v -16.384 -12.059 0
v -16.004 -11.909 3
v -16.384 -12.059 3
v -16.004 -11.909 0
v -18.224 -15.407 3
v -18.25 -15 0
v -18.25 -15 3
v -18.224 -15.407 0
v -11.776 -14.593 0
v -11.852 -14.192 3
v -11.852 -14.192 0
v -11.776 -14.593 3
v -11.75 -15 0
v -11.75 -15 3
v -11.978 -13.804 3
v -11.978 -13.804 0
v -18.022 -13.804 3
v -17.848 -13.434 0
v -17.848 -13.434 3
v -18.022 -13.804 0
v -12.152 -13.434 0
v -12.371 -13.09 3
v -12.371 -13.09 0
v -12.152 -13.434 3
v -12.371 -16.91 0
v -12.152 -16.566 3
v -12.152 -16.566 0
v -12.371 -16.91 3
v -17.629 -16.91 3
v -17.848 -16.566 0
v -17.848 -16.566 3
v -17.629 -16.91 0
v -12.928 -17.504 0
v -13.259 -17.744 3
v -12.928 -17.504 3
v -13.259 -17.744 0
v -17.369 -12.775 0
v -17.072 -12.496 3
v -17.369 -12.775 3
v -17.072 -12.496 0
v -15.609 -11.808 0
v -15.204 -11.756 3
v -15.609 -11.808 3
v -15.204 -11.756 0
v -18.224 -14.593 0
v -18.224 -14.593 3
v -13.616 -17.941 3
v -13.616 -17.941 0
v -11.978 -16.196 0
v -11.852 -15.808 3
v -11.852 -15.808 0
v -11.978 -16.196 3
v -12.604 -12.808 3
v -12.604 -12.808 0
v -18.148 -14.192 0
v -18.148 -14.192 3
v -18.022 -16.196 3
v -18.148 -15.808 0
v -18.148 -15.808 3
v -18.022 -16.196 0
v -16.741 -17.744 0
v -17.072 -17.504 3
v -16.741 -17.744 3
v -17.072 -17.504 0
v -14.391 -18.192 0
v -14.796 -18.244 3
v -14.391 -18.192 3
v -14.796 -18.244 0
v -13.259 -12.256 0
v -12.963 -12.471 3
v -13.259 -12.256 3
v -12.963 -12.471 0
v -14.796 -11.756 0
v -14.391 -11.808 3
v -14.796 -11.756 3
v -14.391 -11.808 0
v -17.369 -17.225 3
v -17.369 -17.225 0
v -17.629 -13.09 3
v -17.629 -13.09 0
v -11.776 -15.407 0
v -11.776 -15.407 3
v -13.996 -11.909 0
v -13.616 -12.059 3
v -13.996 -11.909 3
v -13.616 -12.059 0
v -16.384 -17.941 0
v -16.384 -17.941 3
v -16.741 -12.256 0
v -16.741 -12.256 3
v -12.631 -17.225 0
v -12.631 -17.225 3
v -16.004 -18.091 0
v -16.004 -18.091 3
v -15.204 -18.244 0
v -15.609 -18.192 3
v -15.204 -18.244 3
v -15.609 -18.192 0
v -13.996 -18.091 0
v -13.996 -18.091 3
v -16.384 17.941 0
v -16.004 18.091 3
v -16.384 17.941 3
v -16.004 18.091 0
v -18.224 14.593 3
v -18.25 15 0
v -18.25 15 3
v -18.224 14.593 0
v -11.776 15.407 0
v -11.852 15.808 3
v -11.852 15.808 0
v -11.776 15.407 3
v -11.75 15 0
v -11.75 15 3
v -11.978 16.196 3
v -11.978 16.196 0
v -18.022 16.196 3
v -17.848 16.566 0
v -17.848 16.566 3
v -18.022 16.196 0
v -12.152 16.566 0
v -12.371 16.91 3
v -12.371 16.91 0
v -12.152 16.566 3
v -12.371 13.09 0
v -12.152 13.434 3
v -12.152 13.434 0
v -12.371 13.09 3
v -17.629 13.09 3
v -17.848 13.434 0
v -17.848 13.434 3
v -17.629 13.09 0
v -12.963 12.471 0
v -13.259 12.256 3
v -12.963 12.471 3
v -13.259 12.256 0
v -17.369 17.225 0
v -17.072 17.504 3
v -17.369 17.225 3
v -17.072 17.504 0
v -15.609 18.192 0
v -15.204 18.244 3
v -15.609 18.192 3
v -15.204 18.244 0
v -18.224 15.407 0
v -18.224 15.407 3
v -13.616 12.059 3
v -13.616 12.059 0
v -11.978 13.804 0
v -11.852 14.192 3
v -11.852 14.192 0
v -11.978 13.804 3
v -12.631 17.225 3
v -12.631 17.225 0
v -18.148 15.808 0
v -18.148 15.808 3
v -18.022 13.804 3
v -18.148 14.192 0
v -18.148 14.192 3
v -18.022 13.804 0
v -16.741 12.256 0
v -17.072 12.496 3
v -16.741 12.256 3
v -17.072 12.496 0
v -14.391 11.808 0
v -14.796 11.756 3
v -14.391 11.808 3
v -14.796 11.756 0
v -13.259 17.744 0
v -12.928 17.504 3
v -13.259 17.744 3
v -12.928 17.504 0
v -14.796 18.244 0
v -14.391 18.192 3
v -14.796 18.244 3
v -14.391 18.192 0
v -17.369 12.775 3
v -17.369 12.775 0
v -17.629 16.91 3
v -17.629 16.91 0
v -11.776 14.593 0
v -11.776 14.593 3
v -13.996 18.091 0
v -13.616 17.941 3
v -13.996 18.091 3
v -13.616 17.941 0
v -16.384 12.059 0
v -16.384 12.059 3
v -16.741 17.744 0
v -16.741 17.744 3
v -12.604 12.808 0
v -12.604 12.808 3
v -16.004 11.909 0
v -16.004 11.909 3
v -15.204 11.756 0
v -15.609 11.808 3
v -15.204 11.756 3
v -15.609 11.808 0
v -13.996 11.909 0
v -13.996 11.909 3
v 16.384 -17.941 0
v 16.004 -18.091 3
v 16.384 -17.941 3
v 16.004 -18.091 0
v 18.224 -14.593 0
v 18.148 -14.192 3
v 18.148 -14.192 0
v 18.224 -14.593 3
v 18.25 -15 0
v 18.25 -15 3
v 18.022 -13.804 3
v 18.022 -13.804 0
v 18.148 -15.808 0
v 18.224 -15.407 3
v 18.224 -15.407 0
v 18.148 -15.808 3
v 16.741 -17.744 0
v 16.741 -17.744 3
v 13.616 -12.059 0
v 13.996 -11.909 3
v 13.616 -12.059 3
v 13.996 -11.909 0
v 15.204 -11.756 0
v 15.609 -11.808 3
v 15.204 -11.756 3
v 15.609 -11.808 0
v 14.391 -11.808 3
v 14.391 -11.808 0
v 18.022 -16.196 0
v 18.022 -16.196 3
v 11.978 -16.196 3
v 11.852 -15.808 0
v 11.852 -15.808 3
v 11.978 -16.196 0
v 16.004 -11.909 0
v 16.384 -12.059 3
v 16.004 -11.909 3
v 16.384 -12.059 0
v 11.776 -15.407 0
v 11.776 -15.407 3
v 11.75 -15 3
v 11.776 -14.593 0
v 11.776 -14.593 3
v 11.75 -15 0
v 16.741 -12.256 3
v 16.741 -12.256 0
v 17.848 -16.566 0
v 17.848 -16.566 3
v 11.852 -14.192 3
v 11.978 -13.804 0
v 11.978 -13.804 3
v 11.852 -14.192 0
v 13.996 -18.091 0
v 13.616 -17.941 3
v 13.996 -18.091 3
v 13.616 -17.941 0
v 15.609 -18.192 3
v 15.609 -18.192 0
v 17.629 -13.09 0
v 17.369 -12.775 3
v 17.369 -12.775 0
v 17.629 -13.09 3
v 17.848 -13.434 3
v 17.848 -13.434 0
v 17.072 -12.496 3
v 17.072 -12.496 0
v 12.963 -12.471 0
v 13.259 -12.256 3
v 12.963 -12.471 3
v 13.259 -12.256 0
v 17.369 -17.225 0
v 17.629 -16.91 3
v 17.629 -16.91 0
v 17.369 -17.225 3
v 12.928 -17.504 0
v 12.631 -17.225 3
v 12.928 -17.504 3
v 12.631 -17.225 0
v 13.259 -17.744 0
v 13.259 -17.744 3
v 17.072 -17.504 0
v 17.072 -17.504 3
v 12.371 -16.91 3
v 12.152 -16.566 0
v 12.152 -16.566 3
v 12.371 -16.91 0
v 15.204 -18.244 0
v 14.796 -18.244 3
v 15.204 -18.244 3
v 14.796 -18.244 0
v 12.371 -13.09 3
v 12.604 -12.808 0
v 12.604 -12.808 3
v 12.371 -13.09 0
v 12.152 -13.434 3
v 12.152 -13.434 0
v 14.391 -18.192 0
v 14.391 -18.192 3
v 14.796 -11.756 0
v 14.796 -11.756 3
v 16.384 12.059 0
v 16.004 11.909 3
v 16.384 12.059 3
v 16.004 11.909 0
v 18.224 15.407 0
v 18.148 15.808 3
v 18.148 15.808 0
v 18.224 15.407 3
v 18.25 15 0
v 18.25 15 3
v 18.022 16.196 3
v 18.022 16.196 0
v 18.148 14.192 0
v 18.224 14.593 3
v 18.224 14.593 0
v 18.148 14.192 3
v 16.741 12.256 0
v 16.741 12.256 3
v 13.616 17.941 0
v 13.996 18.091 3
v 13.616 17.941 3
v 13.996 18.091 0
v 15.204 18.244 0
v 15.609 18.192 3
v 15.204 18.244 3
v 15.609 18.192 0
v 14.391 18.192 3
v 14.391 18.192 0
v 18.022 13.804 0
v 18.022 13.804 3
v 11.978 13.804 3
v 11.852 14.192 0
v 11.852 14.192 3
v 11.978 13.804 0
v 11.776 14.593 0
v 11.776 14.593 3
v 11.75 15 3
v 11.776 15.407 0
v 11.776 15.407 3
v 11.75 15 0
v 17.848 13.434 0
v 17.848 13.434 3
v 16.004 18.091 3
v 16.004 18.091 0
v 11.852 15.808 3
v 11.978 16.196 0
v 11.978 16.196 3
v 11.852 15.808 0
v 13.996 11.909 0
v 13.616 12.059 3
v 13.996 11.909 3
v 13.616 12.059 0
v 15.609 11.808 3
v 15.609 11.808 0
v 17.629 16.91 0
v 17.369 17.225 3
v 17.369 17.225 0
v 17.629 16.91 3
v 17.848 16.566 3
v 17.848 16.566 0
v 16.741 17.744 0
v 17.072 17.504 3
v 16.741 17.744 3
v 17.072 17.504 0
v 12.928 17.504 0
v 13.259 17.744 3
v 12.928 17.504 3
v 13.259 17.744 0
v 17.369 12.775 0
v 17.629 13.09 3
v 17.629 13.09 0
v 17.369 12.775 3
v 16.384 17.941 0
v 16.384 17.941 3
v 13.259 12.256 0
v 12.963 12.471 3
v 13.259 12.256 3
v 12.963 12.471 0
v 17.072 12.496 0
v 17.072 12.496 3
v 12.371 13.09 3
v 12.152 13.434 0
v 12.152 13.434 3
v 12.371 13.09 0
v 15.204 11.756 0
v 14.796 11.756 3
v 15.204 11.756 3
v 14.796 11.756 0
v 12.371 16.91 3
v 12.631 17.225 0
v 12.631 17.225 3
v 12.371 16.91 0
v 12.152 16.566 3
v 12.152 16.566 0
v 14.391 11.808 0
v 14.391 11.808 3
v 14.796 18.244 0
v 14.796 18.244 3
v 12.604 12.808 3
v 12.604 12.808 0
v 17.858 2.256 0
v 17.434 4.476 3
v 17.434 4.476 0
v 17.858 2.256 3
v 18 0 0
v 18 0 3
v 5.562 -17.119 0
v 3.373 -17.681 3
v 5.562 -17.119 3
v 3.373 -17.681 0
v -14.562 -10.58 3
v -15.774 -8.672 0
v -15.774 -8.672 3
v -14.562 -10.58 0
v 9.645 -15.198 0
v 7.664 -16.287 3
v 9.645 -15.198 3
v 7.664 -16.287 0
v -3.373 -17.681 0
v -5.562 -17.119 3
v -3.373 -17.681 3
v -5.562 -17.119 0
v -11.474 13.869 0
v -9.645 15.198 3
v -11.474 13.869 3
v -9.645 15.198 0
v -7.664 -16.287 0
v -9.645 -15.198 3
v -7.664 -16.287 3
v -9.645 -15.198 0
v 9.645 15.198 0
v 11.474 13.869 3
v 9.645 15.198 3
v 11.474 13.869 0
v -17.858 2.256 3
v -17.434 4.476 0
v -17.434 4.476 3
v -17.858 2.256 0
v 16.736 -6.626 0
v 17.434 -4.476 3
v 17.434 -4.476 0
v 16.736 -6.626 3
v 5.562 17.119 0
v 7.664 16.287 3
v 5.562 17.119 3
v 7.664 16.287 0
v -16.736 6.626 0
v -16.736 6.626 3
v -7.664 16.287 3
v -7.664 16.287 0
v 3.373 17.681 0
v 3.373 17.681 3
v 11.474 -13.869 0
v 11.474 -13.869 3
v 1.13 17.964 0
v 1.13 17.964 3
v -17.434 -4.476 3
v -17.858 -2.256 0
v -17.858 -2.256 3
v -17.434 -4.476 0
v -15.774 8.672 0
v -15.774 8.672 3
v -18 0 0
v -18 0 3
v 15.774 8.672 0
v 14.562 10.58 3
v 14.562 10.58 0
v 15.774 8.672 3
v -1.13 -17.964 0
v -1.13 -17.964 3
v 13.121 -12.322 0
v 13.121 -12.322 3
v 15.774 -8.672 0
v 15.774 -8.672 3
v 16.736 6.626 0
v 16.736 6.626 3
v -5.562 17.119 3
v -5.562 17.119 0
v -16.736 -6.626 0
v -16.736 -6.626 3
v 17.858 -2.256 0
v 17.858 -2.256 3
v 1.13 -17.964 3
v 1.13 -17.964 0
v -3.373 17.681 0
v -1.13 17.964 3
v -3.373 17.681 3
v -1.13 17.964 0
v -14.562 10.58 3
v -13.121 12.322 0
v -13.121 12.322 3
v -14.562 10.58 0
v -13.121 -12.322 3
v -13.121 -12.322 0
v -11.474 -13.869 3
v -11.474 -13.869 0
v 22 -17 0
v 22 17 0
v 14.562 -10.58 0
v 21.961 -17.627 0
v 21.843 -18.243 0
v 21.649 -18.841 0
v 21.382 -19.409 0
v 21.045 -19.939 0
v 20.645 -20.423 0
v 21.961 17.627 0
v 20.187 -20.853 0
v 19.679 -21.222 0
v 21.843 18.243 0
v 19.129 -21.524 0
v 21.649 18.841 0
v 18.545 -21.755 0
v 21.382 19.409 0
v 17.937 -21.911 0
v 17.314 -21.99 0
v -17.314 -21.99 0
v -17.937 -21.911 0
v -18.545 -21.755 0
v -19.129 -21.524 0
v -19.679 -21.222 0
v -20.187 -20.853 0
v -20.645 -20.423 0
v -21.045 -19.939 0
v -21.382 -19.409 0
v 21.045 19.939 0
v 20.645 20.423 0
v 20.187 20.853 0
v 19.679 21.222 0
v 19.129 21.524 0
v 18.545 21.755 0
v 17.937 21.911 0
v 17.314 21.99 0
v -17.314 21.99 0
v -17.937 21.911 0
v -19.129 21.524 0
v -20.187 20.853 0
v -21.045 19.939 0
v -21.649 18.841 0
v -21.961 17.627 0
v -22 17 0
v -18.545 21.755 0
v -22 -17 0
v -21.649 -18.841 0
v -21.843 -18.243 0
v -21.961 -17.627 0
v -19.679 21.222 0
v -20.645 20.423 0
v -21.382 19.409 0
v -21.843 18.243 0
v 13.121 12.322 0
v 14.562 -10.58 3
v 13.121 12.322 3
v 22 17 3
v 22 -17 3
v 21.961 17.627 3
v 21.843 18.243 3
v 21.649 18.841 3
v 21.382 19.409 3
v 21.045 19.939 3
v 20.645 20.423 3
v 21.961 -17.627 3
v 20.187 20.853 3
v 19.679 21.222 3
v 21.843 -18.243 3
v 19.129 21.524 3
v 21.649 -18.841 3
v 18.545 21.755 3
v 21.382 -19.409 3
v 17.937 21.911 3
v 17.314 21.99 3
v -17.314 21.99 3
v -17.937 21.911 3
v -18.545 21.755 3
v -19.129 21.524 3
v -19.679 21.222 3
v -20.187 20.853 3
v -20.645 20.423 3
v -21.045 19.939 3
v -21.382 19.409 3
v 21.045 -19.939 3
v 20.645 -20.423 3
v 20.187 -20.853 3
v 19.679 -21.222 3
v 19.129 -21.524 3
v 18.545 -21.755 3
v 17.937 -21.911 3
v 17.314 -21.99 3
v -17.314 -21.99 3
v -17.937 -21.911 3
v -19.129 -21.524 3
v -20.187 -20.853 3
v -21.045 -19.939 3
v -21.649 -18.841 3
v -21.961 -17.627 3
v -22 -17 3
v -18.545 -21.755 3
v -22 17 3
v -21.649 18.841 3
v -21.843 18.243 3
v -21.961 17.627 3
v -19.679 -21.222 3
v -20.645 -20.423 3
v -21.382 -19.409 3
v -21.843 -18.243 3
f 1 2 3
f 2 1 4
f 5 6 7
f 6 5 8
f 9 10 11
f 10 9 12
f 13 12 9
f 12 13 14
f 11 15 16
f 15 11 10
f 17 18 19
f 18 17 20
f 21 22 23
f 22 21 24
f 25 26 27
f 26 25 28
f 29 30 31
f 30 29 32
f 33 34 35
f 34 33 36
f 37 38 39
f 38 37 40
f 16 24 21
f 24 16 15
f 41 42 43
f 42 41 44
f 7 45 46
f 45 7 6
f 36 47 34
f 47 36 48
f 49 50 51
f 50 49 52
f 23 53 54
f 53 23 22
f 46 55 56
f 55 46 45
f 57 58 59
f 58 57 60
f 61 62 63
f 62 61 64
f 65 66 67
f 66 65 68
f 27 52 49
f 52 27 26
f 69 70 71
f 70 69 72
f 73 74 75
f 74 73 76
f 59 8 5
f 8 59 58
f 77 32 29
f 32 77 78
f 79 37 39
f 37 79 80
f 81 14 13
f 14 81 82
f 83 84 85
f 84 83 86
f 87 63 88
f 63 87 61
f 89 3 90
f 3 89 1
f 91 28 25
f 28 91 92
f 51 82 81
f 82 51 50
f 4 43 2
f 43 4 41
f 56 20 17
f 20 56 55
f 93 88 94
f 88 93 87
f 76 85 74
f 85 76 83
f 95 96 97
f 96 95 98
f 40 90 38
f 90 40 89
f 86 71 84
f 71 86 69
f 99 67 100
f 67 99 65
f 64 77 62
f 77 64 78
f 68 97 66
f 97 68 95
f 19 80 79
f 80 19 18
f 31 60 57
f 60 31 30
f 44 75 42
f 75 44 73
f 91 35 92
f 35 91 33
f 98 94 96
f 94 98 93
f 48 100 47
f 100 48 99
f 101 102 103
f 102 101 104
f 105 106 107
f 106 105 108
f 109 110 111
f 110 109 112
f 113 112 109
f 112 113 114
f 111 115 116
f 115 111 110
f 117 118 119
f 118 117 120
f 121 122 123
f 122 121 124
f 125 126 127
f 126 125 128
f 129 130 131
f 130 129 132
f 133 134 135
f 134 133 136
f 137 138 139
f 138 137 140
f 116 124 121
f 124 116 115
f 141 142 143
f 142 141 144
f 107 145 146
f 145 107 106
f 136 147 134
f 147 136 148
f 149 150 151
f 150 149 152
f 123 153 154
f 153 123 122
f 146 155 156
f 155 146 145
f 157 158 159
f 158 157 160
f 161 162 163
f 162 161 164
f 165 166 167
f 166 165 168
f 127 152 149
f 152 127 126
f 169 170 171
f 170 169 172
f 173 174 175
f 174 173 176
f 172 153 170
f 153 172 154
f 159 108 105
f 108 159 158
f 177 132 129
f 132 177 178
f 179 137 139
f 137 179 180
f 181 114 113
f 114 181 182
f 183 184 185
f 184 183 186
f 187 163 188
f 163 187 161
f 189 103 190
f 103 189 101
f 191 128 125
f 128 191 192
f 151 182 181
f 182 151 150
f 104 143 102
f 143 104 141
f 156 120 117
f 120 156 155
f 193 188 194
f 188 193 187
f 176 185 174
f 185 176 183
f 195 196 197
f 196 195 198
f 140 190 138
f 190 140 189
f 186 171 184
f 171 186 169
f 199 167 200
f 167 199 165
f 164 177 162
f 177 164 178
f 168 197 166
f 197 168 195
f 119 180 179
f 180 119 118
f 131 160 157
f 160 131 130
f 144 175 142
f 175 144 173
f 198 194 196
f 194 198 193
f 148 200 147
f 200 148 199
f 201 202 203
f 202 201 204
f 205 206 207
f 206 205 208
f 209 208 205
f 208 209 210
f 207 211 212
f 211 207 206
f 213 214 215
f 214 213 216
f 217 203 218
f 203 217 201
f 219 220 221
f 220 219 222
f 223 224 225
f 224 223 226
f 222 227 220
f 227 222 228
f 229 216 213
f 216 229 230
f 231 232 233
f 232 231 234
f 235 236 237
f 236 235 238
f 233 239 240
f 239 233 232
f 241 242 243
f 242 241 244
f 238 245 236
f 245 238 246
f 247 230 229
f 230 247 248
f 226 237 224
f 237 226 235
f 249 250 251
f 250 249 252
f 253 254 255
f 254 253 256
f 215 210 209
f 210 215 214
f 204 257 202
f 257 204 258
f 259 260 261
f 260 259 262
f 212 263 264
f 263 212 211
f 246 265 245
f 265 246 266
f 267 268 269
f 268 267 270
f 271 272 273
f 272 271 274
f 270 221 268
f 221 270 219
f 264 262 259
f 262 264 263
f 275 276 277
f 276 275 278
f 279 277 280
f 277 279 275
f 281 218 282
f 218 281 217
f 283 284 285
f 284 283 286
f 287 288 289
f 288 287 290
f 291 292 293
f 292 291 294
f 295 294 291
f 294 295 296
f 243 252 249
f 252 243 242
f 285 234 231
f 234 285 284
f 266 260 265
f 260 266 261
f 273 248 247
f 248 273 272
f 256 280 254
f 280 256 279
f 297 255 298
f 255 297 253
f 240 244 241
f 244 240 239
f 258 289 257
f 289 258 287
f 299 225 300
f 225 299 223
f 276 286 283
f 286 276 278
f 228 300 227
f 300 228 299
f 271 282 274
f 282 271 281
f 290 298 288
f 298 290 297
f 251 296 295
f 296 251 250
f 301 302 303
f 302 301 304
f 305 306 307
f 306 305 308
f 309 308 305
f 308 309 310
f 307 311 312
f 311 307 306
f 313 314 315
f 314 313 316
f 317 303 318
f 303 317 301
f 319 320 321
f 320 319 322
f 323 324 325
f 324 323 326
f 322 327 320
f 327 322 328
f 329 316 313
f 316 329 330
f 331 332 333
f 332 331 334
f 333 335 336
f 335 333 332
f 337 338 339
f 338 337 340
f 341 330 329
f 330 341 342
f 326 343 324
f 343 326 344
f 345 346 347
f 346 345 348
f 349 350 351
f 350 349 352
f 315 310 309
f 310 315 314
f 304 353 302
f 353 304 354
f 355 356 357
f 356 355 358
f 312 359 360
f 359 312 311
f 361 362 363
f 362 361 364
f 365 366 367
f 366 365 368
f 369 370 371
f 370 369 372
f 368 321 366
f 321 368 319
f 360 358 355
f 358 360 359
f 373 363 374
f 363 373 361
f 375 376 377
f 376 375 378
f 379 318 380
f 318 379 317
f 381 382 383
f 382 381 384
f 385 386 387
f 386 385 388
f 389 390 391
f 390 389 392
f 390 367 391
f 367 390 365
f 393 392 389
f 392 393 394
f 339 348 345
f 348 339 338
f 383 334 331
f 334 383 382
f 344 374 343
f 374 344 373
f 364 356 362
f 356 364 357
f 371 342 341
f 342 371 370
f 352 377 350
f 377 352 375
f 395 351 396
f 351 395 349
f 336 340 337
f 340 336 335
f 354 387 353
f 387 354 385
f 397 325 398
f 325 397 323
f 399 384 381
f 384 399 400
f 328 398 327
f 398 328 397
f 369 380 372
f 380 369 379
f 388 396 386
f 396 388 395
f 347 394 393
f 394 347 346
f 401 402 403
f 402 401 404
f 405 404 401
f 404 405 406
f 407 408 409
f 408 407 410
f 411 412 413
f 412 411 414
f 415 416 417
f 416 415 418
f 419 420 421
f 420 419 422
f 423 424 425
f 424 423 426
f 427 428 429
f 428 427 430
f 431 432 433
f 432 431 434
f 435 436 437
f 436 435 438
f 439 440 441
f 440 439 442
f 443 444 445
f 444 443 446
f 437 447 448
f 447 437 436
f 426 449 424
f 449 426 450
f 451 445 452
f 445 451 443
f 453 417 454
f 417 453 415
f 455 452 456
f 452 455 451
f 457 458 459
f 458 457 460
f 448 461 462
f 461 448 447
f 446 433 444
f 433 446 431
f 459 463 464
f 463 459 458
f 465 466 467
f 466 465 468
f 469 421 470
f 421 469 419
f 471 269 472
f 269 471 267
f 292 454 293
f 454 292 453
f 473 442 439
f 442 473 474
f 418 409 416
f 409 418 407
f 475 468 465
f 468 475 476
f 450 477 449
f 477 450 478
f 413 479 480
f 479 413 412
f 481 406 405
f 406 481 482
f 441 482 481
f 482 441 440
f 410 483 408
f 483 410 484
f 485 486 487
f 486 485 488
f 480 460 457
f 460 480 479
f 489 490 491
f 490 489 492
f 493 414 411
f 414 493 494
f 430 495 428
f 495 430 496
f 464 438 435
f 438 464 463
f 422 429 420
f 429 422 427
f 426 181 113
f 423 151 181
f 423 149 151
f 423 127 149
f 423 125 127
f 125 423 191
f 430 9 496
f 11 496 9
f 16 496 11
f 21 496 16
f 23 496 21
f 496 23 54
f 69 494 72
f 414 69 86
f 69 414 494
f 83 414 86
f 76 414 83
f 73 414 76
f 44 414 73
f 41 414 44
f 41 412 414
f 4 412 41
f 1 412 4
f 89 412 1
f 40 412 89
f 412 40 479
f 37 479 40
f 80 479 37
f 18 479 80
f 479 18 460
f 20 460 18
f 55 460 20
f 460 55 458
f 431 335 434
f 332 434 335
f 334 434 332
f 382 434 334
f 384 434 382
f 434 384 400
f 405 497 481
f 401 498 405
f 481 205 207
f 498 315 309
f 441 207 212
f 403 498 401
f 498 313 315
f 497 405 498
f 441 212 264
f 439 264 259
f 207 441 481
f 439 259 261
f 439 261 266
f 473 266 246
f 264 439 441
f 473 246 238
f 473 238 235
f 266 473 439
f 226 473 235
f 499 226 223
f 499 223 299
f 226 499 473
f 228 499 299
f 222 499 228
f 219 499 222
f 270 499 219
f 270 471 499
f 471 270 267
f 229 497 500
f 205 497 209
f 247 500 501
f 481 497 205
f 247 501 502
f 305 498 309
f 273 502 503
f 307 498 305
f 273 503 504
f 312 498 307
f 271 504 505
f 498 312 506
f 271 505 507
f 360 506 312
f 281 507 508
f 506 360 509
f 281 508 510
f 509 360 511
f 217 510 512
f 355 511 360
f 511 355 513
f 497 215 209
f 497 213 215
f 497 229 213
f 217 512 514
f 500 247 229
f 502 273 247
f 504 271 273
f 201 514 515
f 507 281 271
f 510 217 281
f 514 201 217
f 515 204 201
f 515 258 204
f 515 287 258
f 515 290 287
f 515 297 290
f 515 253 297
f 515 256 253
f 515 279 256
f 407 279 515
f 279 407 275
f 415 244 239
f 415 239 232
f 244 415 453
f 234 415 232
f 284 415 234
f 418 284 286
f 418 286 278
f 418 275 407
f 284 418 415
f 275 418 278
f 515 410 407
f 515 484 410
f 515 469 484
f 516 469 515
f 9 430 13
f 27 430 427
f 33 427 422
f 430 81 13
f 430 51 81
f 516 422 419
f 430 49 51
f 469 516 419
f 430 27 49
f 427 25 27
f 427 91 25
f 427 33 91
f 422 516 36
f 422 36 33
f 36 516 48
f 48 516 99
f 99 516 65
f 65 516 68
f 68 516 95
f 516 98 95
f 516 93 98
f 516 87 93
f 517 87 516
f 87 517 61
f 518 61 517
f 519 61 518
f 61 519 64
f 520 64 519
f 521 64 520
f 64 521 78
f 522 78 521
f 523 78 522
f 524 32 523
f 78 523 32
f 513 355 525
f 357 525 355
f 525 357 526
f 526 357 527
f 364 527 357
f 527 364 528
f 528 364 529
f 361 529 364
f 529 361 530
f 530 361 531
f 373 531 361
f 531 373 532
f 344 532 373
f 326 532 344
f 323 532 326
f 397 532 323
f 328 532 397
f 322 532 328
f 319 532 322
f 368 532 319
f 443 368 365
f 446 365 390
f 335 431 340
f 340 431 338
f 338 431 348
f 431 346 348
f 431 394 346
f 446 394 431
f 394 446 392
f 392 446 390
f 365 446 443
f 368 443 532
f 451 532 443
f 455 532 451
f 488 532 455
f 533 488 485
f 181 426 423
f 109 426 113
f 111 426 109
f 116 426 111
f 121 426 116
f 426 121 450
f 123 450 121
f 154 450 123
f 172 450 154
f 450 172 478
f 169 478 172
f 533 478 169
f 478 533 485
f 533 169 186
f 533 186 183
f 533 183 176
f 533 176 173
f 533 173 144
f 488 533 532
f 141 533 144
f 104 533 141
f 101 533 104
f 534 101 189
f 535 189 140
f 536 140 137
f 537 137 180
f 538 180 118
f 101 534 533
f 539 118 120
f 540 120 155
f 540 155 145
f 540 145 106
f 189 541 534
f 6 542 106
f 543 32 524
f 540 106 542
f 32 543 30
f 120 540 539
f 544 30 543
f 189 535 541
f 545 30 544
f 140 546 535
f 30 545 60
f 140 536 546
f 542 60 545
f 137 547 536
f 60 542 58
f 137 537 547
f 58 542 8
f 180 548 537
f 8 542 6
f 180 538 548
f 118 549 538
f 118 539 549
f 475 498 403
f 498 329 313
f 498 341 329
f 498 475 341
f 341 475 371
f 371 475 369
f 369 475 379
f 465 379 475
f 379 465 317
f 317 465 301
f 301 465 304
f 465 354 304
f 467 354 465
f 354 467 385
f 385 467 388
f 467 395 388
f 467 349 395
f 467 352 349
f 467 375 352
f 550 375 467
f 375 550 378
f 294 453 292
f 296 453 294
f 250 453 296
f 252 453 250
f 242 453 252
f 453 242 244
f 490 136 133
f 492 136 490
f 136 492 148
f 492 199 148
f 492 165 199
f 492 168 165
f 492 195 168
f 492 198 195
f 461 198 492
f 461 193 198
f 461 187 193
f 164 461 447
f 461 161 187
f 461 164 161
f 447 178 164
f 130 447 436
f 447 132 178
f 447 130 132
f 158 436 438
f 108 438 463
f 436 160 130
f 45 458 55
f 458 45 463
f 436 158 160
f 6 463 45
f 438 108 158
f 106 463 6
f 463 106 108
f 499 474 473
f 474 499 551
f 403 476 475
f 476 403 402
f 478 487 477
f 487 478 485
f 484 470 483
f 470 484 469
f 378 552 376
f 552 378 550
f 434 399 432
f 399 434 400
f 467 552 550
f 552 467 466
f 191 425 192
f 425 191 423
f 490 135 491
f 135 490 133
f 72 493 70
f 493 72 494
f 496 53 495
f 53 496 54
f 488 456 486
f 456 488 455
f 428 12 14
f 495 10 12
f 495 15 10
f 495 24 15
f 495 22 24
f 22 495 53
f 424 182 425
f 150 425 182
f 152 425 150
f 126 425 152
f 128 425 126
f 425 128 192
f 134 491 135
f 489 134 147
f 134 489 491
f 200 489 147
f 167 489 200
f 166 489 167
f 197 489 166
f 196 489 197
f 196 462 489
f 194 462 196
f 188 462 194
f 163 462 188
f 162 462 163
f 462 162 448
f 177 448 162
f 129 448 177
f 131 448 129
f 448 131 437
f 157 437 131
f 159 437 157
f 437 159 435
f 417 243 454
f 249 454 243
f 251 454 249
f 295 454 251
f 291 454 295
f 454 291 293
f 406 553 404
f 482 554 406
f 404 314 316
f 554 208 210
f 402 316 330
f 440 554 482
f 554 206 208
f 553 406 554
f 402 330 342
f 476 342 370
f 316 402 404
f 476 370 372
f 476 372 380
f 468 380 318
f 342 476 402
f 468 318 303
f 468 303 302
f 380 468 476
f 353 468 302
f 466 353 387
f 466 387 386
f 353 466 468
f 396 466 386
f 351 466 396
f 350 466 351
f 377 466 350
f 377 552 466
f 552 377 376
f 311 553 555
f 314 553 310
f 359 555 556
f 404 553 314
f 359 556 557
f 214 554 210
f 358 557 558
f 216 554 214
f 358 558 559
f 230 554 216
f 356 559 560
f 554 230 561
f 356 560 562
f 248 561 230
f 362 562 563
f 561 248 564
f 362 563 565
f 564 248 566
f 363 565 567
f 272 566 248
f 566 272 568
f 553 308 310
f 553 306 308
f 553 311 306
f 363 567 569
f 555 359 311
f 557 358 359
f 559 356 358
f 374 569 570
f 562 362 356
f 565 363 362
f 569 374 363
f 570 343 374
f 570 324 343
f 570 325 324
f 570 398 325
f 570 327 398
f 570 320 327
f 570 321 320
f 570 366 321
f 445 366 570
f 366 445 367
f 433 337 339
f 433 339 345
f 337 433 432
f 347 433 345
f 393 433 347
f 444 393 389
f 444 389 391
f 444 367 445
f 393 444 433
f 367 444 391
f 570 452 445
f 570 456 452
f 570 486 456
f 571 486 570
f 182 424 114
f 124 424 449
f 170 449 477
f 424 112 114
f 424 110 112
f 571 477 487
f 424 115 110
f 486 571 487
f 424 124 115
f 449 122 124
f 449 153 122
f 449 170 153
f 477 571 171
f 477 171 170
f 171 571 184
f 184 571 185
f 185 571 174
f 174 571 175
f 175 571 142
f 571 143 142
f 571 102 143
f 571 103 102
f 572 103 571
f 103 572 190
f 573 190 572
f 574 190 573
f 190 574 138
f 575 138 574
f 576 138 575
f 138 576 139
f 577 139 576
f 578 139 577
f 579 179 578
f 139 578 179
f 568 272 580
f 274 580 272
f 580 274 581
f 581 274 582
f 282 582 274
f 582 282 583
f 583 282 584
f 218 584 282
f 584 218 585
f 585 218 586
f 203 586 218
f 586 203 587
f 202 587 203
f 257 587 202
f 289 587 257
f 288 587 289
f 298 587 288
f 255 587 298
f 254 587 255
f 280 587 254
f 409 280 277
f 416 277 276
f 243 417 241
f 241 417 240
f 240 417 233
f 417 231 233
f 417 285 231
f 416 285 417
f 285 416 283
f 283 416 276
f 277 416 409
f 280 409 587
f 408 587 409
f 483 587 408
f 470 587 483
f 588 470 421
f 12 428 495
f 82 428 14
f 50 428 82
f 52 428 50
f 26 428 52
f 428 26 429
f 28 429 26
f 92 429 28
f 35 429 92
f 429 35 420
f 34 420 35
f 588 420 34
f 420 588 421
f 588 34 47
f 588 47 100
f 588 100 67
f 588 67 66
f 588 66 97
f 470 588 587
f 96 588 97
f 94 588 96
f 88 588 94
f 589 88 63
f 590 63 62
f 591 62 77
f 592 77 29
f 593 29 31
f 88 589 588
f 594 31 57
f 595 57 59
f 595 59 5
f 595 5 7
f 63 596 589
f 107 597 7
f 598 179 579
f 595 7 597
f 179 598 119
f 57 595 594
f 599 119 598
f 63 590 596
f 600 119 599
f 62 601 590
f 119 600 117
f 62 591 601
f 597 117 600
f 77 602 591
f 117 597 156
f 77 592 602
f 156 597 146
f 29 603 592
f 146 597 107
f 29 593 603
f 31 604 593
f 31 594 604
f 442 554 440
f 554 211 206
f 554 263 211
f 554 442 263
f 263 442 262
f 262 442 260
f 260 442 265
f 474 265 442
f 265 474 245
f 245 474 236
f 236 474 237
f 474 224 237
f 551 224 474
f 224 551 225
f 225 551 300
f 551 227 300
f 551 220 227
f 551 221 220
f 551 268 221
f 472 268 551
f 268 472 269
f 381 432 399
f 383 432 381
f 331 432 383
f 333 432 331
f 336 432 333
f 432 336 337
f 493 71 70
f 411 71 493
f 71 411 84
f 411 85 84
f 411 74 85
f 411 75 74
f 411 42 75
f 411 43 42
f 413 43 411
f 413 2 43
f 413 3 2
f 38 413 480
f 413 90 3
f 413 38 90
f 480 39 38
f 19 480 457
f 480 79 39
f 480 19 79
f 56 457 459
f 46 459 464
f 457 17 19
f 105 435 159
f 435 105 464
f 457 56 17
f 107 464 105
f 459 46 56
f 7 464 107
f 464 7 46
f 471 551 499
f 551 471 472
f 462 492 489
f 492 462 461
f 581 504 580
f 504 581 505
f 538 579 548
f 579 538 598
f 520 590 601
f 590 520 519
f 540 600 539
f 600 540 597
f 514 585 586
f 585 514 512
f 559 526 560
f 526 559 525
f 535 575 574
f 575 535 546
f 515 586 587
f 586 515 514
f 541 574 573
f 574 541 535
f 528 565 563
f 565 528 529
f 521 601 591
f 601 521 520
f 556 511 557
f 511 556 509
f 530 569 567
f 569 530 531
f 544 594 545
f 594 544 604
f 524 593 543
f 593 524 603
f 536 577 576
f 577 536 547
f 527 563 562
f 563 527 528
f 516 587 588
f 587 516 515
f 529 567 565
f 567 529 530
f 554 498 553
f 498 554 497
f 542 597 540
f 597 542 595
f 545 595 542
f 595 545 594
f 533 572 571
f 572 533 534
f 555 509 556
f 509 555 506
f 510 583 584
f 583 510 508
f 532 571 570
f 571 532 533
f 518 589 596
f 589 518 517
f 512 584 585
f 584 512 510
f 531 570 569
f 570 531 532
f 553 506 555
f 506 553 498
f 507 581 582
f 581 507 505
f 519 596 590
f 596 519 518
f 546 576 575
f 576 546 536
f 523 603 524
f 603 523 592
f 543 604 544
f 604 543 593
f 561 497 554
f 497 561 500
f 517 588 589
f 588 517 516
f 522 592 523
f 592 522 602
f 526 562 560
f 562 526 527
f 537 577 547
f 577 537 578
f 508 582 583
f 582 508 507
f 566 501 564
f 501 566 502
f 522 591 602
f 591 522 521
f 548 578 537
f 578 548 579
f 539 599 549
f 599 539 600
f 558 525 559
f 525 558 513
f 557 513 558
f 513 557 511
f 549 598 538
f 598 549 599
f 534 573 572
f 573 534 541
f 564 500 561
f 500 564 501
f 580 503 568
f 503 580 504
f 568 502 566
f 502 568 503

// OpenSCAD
$fn = 50;

difference() {
	union() {
		hull() {
			translate(v = [-17.0, 17.0, 0]) {
				cylinder(h = 3, r = 5);
			}
			translate(v = [17.0, 17.0, 0]) {
				cylinder(h = 3, r = 5);
			}
			translate(v = [-17.0, -17.0, 0]) {
				cylinder(h = 3, r = 5);
			}
			translate(v = [17.0, -17.0, 0]) {
				cylinder(h = 3, r = 5);
			}
		}
	}
	union() {
		translate(v = [-15.0, -15.0, -100.0]) {
			cylinder(h = 200, r = 3.25);
		}
		translate(v = [-15.0, 15.0, -100.0]) {
			cylinder(h = 200, r = 3.25);
		}
		translate(v = [15.0, -15.0, -100.0]) {
			cylinder(h = 200, r = 3.25);
		}
		translate(v = [15.0, 15.0, -100.0]) {
			cylinder(h = 200, r = 3.25);
		}
		translate(v = [-15.0, -15.0, -100.0]) {
			cylinder(h = 200, r = 1.8);
		}
		translate(v = [-15.0, 15.0, -100.0]) {
			cylinder(h = 200, r = 1.8);
		}
		translate(v = [15.0, -15.0, -100.0]) {
			cylinder(h = 200, r = 1.8);
		}
		translate(v = [15.0, 15.0, -100.0]) {
			cylinder(h = 200, r = 1.8);
		}
		cylinder(h = 3, r = 18.0);
	}
}
